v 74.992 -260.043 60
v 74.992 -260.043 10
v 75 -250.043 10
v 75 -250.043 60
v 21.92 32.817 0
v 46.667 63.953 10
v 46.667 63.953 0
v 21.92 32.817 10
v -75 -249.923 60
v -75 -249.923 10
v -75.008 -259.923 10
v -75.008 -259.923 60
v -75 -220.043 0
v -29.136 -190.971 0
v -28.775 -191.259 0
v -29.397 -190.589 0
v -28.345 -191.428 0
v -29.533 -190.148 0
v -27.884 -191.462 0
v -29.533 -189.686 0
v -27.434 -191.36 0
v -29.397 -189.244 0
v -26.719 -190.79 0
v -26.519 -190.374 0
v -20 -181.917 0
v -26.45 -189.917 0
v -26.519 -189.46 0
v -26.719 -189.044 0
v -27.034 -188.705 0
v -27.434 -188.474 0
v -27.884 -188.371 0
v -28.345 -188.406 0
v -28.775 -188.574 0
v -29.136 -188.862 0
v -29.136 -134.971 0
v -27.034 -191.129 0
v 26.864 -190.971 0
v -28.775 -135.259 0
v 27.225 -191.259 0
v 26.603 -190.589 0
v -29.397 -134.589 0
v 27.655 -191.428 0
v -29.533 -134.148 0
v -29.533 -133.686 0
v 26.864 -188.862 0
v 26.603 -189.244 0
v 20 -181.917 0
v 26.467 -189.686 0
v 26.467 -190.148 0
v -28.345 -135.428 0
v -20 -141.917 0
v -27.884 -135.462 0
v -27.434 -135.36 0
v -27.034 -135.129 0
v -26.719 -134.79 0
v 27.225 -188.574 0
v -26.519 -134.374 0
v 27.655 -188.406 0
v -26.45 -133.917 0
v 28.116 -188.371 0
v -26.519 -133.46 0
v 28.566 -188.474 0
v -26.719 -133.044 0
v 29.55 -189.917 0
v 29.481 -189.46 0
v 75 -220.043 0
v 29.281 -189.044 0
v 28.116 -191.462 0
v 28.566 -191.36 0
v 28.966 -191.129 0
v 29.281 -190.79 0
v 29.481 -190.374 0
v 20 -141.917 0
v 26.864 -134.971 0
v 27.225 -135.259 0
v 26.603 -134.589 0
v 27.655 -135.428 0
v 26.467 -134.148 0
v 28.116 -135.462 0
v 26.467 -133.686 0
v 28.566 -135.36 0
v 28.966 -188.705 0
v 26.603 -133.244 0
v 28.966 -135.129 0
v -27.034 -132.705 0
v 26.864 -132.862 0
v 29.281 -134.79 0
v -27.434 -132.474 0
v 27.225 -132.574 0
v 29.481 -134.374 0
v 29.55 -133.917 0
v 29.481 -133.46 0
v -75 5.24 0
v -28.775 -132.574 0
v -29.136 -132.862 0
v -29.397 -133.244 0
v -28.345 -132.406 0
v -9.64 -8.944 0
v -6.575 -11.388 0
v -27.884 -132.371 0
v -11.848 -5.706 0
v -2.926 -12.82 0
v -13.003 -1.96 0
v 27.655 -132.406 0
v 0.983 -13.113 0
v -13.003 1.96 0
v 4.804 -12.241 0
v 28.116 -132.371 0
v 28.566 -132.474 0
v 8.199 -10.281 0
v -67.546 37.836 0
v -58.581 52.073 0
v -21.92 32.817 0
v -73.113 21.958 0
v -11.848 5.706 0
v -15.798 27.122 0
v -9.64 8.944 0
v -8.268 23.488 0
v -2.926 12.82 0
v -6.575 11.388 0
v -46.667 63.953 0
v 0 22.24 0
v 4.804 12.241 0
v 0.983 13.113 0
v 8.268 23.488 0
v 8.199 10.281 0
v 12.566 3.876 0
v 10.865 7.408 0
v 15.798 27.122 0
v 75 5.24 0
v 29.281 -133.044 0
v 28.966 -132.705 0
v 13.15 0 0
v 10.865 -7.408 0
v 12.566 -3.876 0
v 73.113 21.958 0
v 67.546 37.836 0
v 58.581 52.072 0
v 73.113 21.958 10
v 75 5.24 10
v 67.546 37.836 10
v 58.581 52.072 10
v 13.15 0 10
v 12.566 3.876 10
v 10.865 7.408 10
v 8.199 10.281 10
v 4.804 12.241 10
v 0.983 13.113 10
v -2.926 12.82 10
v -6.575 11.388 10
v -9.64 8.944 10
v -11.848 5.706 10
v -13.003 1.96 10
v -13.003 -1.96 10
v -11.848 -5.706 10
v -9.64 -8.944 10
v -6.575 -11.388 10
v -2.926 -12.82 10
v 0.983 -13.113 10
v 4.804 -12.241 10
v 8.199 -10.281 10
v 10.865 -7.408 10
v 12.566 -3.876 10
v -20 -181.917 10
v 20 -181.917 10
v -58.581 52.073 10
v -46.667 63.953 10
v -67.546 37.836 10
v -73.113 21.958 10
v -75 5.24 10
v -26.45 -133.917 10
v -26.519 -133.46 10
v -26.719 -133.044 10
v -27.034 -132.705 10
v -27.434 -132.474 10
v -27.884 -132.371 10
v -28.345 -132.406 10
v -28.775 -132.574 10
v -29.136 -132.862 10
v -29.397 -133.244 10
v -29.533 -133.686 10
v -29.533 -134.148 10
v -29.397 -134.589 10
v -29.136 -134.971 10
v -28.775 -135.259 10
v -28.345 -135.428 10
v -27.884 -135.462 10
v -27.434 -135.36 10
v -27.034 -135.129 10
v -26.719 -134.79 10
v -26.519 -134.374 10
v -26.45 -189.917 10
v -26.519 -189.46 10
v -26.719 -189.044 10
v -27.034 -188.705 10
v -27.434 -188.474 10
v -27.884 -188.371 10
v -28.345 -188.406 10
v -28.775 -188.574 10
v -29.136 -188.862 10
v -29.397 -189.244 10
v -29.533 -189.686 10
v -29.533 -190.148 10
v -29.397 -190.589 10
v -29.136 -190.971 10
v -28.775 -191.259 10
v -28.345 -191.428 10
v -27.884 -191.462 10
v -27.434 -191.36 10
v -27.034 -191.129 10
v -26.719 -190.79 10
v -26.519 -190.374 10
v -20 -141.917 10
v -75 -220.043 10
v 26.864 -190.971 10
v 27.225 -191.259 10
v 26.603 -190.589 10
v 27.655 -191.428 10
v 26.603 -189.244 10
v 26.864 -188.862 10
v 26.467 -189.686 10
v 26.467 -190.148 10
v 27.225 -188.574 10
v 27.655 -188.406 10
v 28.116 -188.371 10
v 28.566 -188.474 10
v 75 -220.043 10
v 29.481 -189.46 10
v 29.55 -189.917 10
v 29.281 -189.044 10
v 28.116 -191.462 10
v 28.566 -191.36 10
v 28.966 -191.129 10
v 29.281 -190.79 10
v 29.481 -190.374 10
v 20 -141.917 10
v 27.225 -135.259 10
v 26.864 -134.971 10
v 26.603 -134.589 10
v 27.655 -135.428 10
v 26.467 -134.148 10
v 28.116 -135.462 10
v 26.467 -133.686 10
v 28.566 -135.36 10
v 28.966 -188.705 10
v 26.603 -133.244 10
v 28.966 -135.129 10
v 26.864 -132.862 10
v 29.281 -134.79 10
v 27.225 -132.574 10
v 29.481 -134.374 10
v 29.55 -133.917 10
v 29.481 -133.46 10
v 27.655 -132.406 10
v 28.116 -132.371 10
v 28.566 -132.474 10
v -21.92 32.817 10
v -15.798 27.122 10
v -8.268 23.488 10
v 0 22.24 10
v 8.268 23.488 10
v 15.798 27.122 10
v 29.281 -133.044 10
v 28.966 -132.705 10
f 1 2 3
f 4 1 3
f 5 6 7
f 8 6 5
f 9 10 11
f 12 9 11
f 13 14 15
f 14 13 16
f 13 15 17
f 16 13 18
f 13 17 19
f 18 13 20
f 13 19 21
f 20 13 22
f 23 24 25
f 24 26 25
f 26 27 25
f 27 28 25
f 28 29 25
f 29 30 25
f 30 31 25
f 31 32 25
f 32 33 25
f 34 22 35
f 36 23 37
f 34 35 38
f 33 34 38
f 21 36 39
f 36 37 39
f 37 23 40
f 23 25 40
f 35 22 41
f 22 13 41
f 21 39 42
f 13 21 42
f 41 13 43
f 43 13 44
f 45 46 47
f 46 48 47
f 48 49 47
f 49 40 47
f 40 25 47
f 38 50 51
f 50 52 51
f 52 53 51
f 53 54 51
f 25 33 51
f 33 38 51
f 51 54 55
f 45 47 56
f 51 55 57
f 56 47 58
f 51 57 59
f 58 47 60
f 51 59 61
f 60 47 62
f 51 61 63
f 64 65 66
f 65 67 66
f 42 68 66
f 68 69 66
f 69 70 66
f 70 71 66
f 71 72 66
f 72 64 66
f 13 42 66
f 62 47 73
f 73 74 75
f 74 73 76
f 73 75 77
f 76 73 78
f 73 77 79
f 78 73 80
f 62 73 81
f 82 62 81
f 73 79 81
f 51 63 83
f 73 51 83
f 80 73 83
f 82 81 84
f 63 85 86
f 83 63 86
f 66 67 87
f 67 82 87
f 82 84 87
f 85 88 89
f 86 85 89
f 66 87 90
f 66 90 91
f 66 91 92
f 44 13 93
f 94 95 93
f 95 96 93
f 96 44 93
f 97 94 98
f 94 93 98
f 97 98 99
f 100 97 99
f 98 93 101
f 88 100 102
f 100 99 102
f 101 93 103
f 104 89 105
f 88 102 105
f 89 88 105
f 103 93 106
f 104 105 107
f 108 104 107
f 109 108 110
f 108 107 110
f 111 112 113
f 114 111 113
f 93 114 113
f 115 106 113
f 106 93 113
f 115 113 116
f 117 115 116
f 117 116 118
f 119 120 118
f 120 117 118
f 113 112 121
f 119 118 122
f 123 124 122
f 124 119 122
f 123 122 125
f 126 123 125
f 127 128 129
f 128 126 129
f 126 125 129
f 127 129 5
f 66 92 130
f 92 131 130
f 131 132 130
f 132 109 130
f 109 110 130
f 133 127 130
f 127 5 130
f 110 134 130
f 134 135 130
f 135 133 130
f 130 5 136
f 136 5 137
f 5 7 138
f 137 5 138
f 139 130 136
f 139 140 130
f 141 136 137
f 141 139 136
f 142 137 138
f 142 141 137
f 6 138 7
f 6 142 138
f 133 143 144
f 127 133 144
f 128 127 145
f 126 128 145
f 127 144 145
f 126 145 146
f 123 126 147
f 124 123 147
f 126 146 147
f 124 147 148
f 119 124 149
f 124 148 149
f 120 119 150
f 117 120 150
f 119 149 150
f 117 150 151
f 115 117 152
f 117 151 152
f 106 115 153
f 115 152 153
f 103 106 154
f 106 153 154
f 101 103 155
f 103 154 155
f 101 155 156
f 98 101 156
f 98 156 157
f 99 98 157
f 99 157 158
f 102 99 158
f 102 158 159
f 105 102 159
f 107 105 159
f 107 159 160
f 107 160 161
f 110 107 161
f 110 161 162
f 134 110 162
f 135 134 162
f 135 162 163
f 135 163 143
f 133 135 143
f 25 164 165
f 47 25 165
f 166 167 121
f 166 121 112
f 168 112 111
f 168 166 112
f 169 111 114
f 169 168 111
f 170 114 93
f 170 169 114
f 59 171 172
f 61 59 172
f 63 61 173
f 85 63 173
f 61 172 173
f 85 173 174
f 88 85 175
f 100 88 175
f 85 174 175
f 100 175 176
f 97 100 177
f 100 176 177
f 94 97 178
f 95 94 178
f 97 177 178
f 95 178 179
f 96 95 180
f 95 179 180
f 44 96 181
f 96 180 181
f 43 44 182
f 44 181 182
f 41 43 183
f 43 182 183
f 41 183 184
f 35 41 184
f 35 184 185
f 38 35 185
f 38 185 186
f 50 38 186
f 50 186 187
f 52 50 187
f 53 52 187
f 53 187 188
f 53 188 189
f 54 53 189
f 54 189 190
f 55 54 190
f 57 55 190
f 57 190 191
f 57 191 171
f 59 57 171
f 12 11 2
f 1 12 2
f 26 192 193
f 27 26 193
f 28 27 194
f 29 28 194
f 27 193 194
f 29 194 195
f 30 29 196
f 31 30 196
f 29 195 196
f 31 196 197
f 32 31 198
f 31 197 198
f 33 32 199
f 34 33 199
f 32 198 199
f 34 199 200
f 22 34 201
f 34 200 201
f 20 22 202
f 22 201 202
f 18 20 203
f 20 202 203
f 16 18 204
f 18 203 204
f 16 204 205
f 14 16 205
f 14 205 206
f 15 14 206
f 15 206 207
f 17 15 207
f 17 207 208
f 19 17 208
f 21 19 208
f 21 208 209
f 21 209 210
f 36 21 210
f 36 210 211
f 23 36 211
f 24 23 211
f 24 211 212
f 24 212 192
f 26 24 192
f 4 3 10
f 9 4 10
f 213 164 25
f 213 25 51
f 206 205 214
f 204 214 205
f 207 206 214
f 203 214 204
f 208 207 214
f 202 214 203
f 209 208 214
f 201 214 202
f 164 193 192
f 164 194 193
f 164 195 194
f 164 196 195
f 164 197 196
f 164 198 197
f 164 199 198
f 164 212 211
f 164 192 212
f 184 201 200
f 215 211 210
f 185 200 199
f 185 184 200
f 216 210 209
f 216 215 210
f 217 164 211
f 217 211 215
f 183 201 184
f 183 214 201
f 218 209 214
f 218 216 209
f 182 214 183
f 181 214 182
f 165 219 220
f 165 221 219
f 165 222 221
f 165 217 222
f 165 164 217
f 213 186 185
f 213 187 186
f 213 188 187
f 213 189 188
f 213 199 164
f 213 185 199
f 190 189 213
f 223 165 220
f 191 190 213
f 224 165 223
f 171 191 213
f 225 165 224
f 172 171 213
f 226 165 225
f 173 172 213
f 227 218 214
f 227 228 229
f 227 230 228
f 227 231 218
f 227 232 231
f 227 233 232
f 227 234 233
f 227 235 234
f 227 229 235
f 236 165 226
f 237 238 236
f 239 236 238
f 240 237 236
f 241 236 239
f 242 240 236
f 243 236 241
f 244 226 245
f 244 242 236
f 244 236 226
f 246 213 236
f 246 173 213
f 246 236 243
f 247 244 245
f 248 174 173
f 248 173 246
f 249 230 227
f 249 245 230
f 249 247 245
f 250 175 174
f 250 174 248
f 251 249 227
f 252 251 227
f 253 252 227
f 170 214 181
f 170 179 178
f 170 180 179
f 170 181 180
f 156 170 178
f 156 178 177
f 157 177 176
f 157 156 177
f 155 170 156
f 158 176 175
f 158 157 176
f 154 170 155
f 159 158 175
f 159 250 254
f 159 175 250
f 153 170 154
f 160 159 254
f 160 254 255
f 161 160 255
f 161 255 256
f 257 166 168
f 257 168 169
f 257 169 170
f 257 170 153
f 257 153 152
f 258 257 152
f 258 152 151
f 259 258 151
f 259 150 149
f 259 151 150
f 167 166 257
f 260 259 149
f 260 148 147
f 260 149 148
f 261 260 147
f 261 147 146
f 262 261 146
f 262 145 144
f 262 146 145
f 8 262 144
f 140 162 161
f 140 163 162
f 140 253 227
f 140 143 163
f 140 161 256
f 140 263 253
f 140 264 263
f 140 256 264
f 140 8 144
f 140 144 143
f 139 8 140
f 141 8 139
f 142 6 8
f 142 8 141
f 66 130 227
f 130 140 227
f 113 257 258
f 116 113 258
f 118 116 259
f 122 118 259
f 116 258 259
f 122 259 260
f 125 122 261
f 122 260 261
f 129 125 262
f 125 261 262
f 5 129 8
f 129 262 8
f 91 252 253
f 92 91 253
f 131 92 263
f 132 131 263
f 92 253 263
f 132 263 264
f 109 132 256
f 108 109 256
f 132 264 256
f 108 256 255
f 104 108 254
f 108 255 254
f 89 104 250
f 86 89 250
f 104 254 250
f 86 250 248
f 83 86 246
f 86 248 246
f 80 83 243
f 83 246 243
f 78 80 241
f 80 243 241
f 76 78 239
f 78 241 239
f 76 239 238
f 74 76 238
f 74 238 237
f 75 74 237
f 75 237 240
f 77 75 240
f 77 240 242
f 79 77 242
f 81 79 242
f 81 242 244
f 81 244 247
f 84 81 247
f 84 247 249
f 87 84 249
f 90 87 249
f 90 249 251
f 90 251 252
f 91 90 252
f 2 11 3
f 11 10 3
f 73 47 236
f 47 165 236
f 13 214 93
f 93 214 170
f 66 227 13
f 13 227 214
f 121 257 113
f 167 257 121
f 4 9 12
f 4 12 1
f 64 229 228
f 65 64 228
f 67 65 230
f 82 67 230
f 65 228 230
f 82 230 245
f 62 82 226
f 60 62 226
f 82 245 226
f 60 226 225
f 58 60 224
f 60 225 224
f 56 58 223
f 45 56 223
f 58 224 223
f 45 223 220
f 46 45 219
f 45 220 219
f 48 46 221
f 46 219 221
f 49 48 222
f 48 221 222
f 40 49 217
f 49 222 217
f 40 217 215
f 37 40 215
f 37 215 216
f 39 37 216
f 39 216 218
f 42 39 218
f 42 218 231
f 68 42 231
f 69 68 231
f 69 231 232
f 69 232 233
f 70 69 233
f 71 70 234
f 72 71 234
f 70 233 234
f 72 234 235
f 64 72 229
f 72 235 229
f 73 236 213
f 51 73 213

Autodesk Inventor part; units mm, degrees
ref_plane "YZ Plane" through (0, 0, 0) normal (1, 0, 0) x (0, 1, 0)
ref_plane "XZ Plane" through (0, 0, 0) normal (0, 1, 0) x (-1, 0, 0)
ref_plane "XY Plane" through (0, 0, 0) normal (0, 0, 1) x (1, 0, 0)
ref_plane "РабПлоскость1" through (-120, 75, 10) normal (0, 0, 1) x (1, 0, 0)
sketch "Эскиз1" plane through (-120, 75, 10) normal (0, 0, 1) x (1, 0, 0)
  arc A0 (195, -69.7605) -> (166.6667, -11.0474) centre (120, -69.7605) ccw
  line L0 (166.6667, -11.0474) -> (141.9195, -42.1827)
  arc A1 (98.0805, -42.1827) -> (141.9195, -42.1827) centre (120, -24.7605) ccw
  line L1 (98.0805, -42.1827) -> (73.3333, -11.0474)
  arc A2 (73.3333, -11.0474) -> (45, -69.7605) centre (120, -69.7605) ccw
  line L2 (195, -69.7605) -> (195, -295.0427)
  line L3 (195, -295.0427) -> (45, -295.0427)
  line L4 (45, -295.0427) -> (45, -69.7605)
  line L5 (100, -256.9167) -> (100, -216.9167)
  line L6 (100, -256.9167) -> (140, -256.9167)
  line L7 (140, -256.9167) -> (140, -216.9167)
  line L8 (140, -216.9167) -> (100, -216.9167)
  circle A3 centre (148, -208.9167) radius 1.55
  circle A4 centre (148, -264.9167) radius 1.55
  circle A5 centre (92, -208.9167) radius 1.55
  circle A6 centre (92, -264.9167) radius 1.55
  circle A7 centre (120, -75) radius 13.15
  dimension "d21" = 26.3
extrude "Выдавливание1" add sketch "Эскиз1" against normal blind 10
sketch "Эскиз2" plane through (-120, 75, 10) normal (0, 0, 1) x (1, 0, 0)
  line L0 (45, -324.9233) -> (44.9921, -334.9232)
  line L1 (44.9921, -334.9232) -> (194.992, -335.0427)
  line L2 (194.992, -335.0427) -> (195, -325.0427)
  line L3 (195, -325.0427) -> (45, -324.9233)
  point P0 (120, -75)
extrude "Выдавливание2" add sketch "Эскиз2" along normal blind 50
properties part number "Основание"
